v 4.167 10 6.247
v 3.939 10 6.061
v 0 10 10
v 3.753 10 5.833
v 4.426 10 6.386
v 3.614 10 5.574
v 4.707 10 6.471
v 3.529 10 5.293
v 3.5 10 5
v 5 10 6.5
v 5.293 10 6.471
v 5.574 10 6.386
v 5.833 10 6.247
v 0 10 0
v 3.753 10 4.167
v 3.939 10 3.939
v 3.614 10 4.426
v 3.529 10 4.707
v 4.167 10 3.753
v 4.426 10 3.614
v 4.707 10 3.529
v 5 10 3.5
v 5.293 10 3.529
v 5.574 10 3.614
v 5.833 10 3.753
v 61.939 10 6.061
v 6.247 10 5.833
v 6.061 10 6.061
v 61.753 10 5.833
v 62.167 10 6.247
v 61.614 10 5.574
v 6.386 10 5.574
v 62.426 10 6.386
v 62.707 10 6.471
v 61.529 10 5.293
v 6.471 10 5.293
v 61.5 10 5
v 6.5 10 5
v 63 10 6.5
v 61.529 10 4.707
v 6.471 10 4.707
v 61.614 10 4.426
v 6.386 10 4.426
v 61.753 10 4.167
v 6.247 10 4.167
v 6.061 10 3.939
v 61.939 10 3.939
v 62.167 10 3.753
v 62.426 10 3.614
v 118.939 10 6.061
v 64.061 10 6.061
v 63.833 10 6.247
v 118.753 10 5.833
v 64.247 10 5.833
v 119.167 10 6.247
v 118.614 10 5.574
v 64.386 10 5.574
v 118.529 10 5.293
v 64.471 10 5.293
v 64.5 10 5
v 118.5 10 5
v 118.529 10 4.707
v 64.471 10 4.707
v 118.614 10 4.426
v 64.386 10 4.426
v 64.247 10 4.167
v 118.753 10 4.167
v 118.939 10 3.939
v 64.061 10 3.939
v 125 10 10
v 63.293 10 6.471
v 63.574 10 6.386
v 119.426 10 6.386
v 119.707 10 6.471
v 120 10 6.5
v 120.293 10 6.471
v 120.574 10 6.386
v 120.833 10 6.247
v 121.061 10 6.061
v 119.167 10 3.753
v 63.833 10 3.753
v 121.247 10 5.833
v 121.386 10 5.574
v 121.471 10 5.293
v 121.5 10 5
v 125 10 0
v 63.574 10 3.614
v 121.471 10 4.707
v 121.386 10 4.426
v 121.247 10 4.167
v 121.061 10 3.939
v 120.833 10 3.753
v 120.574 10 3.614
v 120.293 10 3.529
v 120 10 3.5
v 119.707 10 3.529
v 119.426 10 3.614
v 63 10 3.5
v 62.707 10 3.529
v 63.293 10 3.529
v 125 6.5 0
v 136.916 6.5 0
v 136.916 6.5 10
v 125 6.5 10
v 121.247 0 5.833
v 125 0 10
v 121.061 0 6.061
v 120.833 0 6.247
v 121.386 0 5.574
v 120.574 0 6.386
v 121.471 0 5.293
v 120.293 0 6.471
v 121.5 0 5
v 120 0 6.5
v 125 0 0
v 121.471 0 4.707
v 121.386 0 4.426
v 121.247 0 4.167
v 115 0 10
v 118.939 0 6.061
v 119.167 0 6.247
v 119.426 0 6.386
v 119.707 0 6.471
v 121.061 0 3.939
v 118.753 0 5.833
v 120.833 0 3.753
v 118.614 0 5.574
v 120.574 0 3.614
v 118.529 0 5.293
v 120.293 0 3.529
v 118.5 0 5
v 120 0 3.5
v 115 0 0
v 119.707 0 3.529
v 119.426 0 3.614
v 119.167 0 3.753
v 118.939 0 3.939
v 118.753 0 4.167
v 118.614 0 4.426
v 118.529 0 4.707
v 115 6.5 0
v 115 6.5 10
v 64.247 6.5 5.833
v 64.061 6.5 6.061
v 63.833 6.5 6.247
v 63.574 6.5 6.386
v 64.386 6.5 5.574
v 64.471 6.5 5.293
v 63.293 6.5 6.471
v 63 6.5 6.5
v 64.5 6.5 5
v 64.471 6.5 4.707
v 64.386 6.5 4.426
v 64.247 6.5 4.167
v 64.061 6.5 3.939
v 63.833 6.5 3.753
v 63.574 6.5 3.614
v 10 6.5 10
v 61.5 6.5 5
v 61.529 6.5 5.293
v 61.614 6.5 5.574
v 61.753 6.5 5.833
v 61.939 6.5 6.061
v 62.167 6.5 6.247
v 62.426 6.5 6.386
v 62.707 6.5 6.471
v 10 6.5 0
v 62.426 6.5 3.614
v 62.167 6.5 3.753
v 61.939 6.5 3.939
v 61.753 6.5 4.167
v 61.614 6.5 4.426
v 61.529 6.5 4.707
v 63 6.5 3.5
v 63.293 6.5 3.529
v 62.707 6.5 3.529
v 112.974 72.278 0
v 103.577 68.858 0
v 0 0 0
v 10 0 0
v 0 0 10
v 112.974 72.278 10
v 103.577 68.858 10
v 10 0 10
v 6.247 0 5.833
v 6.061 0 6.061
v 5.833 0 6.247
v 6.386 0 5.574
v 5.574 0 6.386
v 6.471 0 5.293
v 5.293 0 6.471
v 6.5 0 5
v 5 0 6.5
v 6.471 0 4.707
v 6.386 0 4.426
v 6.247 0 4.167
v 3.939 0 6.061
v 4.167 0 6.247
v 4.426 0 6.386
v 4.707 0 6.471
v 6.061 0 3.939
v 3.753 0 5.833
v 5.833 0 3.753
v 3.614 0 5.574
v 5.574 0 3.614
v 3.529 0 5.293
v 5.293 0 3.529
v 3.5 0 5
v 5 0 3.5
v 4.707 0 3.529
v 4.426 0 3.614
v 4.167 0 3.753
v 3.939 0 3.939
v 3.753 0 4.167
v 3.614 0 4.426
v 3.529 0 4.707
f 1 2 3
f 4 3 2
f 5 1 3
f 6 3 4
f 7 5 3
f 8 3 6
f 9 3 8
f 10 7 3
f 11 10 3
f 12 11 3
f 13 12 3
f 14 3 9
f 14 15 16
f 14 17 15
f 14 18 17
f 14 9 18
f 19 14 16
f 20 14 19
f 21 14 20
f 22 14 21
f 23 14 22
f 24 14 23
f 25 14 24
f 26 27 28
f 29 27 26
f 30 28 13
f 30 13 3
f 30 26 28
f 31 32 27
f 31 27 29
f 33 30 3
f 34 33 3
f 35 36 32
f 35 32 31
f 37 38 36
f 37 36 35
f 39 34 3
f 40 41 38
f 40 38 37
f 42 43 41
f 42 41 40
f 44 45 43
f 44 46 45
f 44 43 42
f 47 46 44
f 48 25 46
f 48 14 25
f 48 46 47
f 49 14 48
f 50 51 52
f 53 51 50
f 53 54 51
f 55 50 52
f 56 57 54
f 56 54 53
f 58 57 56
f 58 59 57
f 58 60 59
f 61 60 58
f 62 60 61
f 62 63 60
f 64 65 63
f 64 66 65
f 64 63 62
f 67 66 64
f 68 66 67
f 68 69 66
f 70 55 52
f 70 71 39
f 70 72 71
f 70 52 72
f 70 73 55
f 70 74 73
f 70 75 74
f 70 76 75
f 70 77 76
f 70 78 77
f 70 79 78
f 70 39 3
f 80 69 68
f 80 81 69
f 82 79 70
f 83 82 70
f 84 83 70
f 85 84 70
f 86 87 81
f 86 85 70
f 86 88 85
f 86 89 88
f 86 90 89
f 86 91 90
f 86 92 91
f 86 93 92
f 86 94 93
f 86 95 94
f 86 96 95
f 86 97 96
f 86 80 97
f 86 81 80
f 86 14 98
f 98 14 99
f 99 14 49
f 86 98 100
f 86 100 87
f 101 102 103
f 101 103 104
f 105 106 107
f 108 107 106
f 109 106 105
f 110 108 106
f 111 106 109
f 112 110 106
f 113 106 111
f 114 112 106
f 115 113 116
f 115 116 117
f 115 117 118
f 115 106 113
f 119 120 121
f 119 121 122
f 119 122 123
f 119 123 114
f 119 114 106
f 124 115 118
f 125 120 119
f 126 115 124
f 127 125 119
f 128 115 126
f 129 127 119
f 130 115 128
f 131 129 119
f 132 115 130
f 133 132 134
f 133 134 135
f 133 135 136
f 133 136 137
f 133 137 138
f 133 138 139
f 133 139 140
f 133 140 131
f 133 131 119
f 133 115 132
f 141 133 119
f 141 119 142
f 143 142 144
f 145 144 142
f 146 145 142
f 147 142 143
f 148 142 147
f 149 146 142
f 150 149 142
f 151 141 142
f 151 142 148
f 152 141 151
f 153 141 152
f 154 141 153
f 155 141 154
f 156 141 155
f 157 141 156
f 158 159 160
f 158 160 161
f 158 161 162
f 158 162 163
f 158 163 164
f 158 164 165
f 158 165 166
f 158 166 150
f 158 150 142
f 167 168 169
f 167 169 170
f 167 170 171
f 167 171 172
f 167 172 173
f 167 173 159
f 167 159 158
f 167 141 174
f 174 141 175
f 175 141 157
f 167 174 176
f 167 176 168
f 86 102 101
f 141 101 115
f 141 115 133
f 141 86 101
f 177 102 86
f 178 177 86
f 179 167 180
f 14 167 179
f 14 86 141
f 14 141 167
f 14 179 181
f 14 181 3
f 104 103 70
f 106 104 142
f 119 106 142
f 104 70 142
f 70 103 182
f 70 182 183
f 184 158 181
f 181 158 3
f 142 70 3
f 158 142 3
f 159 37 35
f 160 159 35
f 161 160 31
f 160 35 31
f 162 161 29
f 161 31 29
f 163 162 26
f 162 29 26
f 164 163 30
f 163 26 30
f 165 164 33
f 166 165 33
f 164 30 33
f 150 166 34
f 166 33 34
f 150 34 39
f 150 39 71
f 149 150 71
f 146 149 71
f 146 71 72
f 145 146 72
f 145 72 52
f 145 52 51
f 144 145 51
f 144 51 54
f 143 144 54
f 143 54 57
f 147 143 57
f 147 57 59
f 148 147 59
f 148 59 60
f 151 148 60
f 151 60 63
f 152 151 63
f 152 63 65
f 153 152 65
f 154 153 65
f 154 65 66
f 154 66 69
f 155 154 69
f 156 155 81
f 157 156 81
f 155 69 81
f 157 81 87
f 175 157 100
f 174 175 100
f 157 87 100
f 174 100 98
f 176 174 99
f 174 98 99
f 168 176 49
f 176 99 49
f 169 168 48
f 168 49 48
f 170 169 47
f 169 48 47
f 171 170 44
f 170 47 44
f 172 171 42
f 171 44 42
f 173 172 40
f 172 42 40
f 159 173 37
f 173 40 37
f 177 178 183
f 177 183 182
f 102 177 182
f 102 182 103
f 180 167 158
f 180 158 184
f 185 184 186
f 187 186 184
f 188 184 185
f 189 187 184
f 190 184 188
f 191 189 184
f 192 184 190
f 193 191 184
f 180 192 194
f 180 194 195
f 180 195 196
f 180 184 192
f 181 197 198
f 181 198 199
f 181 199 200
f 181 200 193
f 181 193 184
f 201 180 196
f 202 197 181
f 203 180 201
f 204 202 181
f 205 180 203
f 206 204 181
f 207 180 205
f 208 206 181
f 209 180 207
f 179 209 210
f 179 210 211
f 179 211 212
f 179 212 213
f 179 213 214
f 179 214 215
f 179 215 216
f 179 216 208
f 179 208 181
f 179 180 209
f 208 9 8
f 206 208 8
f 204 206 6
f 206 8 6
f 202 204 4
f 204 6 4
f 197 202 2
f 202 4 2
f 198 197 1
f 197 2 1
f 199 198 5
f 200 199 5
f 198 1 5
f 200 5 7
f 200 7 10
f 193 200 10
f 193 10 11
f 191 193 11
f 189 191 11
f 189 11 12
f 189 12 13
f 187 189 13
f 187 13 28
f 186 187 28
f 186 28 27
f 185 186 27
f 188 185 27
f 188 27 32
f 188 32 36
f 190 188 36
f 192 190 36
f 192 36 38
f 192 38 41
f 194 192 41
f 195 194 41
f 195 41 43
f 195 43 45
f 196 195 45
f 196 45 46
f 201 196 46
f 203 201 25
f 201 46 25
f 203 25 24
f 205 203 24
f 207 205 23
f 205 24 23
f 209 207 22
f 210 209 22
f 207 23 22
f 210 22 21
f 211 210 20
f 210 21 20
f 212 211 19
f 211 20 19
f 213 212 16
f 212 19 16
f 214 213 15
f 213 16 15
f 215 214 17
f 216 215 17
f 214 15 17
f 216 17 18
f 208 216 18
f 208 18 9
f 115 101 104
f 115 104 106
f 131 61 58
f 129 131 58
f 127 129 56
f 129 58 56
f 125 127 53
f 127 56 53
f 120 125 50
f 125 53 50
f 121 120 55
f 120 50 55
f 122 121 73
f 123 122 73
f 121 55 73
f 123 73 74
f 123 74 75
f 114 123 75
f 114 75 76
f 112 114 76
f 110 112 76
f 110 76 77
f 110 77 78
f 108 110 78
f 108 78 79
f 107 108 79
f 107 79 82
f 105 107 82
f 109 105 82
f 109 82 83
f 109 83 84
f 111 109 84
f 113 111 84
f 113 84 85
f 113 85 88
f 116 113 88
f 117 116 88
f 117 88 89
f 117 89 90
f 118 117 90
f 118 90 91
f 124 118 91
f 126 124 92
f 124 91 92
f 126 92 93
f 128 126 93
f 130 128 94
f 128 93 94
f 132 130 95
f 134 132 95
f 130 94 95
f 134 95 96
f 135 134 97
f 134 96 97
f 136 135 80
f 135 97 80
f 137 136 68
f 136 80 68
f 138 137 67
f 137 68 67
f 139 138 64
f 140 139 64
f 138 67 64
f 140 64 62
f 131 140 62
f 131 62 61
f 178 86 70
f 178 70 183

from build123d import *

# Parameters (mm, degrees)
PAD_DEPTH    = 10
SKETCH001_R  = 1.5
POCKET_DEPTH = 10.001


with BuildPart() as part:
    # Sketch → Pad (new body)
    with BuildSketch(Plane.XY):
        Polygon((0, 0), (0, 10), (125, 10), (103.577337, 68.858282), (112.974264, 72.278483), (136.915674, 6.5), (125, 6.5), (125, 0), (115, 0), (115, 6.5), (10, 6.5), (10, 0), align=None)
    extrude(amount=PAD_DEPTH)

    # Sketch001 (on Face2 of Pad) → Pocket (cut, through all)
    with BuildSketch(Plane(origin=(0, 10, 0), x_dir=(-1, 0, 0), z_dir=(0, 1, 0))):
        with Locations((-5, 5)):
            Circle(SKETCH001_R)
        with Locations((-120, 5)):
            Circle(SKETCH001_R)
        with Locations((-63, 5)):
            Circle(SKETCH001_R)
    extrude(amount=-POCKET_DEPTH, mode=Mode.SUBTRACT)


solid = part.part
